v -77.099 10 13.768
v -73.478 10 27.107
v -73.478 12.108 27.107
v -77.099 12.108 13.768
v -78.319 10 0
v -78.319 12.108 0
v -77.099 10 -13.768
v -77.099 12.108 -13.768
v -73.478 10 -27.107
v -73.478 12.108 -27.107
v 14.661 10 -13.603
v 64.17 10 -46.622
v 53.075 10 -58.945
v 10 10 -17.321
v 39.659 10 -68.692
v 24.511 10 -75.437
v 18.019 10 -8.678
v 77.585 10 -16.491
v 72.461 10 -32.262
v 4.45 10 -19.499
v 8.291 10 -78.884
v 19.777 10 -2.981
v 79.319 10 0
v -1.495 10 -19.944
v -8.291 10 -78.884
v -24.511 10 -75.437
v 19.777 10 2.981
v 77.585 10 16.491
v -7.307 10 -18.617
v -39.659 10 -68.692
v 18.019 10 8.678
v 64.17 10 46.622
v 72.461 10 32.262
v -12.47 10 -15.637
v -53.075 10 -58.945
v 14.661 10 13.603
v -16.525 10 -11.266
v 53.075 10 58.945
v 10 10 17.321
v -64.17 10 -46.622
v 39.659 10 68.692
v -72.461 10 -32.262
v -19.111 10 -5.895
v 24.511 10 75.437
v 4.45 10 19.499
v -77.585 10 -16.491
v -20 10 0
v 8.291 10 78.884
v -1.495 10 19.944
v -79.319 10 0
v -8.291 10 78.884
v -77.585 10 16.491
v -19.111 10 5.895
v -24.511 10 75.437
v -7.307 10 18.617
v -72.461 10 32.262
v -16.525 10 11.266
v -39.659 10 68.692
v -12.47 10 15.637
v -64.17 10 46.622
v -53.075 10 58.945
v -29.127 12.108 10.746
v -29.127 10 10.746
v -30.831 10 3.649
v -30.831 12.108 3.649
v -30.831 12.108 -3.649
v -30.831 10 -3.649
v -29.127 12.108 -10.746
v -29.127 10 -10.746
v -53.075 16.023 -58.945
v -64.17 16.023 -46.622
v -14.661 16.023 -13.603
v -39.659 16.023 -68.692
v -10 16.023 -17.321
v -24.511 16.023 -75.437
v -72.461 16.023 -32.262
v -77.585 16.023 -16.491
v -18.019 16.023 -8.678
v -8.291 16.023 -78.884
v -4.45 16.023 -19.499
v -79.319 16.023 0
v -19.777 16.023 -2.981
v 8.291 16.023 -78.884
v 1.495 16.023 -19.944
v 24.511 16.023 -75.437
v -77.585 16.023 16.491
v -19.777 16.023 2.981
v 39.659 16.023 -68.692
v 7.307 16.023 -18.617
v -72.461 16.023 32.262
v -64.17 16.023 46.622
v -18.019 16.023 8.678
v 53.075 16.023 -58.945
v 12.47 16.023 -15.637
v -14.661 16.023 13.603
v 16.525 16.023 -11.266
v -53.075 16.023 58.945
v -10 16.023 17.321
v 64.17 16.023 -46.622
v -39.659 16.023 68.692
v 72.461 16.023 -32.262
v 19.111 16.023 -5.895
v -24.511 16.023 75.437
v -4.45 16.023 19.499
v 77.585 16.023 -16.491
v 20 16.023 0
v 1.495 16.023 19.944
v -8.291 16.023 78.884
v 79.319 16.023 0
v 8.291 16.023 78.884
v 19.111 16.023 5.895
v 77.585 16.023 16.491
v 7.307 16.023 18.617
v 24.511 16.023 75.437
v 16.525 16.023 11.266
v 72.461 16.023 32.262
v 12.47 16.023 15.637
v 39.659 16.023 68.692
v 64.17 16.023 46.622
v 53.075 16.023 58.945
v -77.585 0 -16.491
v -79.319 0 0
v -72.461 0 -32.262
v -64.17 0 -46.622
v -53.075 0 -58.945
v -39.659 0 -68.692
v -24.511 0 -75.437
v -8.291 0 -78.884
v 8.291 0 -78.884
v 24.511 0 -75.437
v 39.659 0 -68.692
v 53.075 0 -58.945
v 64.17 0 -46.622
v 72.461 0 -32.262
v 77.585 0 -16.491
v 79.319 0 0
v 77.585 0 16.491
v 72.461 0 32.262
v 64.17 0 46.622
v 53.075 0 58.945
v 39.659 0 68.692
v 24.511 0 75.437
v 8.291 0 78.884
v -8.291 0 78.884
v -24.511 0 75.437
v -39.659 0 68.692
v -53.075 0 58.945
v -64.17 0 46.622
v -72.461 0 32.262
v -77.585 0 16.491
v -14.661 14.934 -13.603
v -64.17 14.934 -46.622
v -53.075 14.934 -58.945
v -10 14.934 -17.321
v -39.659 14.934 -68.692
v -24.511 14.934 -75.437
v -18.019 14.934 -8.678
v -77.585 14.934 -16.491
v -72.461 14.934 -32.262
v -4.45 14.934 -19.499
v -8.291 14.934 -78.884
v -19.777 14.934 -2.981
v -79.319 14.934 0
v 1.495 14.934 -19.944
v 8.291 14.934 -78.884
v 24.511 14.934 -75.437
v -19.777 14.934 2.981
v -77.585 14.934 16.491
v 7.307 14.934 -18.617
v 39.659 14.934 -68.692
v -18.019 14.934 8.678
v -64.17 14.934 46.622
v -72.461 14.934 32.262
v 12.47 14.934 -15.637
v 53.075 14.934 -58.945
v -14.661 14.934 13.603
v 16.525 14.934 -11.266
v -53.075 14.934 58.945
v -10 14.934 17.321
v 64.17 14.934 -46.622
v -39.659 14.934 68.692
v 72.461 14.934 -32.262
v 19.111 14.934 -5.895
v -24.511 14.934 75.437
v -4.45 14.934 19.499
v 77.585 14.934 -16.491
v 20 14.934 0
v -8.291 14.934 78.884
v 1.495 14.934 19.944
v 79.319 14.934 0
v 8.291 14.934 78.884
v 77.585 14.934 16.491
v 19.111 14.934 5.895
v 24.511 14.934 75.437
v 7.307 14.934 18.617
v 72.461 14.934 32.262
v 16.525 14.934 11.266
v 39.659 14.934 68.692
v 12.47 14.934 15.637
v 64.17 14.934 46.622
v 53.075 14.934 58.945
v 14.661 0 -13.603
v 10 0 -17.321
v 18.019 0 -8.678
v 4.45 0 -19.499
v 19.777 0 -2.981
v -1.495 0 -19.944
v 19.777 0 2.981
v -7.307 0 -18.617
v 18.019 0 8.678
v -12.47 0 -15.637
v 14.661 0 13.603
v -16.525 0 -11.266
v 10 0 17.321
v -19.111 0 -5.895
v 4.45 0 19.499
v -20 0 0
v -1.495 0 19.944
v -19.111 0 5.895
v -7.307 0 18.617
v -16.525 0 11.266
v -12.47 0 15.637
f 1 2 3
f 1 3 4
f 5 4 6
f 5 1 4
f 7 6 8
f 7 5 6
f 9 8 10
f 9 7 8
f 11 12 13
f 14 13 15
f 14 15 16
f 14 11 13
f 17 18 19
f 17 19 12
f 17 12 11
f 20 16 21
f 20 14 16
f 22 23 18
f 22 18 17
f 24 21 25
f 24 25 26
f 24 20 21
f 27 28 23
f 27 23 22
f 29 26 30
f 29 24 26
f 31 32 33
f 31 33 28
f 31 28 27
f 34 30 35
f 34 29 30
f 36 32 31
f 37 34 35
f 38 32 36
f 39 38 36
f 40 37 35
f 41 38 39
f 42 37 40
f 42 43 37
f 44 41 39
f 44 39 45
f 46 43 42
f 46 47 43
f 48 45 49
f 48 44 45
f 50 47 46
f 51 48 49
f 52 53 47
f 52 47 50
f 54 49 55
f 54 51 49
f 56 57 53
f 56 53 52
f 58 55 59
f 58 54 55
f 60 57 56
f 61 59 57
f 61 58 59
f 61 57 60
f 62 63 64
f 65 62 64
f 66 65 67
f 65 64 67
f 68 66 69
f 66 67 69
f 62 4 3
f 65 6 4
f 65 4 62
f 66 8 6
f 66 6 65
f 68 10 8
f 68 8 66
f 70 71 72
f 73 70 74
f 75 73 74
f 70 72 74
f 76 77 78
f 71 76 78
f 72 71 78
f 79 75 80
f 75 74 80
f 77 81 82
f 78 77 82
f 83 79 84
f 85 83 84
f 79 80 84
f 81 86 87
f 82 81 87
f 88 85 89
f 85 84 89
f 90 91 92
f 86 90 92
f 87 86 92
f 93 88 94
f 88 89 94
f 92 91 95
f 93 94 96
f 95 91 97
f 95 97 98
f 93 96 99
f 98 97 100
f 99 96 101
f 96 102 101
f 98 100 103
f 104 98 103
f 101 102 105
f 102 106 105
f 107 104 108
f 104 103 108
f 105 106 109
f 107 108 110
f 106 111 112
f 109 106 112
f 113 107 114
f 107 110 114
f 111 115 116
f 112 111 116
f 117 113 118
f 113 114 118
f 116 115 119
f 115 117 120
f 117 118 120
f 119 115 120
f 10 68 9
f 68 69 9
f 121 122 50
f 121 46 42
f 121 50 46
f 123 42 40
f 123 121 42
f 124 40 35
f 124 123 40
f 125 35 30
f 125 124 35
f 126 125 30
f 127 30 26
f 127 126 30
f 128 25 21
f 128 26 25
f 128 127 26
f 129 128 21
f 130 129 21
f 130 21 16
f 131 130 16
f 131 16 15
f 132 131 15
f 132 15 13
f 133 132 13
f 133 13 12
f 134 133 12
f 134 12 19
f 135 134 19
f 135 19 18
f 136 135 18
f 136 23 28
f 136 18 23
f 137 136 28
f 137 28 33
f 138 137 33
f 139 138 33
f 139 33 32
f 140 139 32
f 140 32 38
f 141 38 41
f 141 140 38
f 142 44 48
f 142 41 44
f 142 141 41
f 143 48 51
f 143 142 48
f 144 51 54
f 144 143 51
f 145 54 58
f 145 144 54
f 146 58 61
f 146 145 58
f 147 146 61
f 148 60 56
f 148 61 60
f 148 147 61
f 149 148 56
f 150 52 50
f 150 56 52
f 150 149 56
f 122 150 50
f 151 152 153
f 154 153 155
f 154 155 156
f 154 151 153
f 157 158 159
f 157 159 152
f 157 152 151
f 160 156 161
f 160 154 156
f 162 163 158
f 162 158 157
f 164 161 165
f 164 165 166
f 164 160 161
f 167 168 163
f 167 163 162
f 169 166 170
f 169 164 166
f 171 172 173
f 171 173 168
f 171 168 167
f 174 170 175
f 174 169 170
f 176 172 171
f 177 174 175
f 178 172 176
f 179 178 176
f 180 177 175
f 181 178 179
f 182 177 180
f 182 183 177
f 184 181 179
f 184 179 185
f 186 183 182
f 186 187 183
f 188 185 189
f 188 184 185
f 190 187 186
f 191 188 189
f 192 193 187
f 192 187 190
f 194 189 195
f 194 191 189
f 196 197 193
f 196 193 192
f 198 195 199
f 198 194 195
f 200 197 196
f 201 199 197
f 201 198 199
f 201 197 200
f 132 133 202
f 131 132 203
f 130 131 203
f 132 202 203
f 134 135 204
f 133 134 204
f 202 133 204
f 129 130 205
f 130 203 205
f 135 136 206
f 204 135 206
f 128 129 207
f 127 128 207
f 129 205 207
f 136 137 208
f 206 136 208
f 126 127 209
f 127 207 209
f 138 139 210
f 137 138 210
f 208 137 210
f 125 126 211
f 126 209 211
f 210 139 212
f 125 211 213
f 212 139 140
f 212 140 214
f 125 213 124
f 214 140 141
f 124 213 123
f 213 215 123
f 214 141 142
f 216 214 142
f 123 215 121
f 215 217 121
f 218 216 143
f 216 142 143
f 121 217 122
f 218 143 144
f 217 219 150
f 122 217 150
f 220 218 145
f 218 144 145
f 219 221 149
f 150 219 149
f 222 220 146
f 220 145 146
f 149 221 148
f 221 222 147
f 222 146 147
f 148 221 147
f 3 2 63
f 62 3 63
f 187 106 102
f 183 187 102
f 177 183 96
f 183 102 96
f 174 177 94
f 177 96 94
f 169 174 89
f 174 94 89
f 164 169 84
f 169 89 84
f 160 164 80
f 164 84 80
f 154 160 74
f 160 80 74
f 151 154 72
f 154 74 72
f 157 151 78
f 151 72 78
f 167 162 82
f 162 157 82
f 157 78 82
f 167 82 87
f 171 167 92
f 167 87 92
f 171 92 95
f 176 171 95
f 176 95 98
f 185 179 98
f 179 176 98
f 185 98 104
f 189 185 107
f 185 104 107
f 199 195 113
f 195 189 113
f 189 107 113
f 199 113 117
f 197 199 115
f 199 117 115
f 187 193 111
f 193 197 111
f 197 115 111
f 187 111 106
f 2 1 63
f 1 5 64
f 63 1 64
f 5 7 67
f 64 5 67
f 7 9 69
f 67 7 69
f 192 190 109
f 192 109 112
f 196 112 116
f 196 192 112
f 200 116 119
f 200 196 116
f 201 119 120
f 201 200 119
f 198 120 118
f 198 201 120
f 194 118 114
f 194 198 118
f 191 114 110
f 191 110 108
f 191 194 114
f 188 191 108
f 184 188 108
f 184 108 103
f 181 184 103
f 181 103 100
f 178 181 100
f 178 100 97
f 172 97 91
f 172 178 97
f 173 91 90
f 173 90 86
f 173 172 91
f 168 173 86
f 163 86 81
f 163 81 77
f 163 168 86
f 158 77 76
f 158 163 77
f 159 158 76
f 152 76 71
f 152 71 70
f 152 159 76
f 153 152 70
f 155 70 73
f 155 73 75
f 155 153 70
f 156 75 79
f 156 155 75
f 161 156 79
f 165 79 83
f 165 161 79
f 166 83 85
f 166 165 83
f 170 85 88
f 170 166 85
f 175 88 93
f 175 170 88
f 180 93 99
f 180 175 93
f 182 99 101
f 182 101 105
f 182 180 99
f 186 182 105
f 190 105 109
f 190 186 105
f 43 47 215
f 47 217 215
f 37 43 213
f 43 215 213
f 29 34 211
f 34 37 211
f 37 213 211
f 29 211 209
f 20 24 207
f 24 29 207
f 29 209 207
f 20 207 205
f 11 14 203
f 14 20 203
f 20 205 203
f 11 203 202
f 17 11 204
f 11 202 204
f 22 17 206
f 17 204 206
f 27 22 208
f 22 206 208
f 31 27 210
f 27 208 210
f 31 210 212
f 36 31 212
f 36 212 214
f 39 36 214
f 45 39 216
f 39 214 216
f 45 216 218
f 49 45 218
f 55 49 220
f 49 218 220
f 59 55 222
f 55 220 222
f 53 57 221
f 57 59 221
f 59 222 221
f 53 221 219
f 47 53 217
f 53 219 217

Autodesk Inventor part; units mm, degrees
ref_plane "YZ Plane" through (0, 0, 0) normal (1, 0, 0) x (0, 1, 0)
ref_plane "XZ Plane" through (0, 0, 0) normal (0, 1, 0) x (-1, 0, 0)
ref_plane "XY Plane" through (0, 0, 0) normal (0, 0, 1) x (1, 0, 0)
sketch "草圖1" plane through (0, 0, 0) normal (0, 1, 0) x (-1, 0, 0)
  circle A0 centre (0, 0) radius 79.3187
  circle A1 centre (0, 0) radius 20
  dimension "d_yo" = 158.6374
  dimension "d_yi" = 40
extrude "擠出1" add sketch "草圖1" along normal blind 10
sketch "草圖2" plane through (0, 10, 0) normal (0, 1, 0) x (1, 0, 0)
  arc A0 (-73.4779, 27.1074) -> (-73.4779, -27.1074) centre (0, 0) ccw
  line L0 (-90.8067, 0) -> (132.5495, 0) construction
  arc A1 (-29.1269, 10.7455) -> (-29.1269, -10.7455) centre (0, 0) ccw
  line L1 (-73.4779, -27.1074) -> (-29.1269, -10.7455)
  line L2 (-29.1269, 10.7455) -> (-73.4779, 27.1074)
  arc A2 (-51.3024, 18.9265) -> (-51.3024, -18.9265) centre (0, 0) ccw construction
  line L3 (-32.7889, -71.1246) -> (-12.9976, -28.194)
  arc A3 (-28.194, -12.9976) -> (-12.9976, -28.194) centre (0, 0) ccw
  line L4 (-28.194, -12.9976) -> (-71.1246, -32.7889)
  arc A4 (-71.1246, -32.7889) -> (-32.7889, -71.1246) centre (0, 0) ccw
  line L5 (27.1074, -73.4779) -> (10.7455, -29.1269)
  arc A5 (-10.7455, -29.1269) -> (10.7455, -29.1269) centre (0, 0) ccw
  line L6 (-10.7455, -29.1269) -> (-27.1074, -73.4779)
  arc A6 (-27.1074, -73.4779) -> (27.1074, -73.4779) centre (0, 0) ccw
  line L7 (71.1246, -32.7889) -> (28.194, -12.9976)
  arc A7 (12.9976, -28.194) -> (28.194, -12.9976) centre (0, 0) ccw
  line L8 (12.9976, -28.194) -> (32.7889, -71.1246)
  arc A8 (32.7889, -71.1246) -> (71.1246, -32.7889) centre (0, 0) ccw
  circle A9 centre (0, 0) radius 20 construction
  line L9 (73.4779, 27.1074) -> (29.1269, 10.7455)
  arc A10 (29.1269, -10.7455) -> (29.1269, 10.7455) centre (0, 0) ccw
  line L10 (29.1269, -10.7455) -> (73.4779, -27.1074)
  arc A11 (73.4779, -27.1074) -> (73.4779, 27.1074) centre (0, 0) ccw
  line L11 (32.7889, 71.1246) -> (12.9976, 28.194)
  arc A12 (28.194, 12.9976) -> (12.9976, 28.194) centre (0, 0) ccw
  line L12 (28.194, 12.9976) -> (71.1246, 32.7889)
  arc A13 (71.1246, 32.7889) -> (32.7889, 71.1246) centre (0, 0) ccw
  line L13 (-27.1074, 73.4779) -> (-10.7455, 29.1269)
  arc A14 (10.7455, 29.1269) -> (-10.7455, 29.1269) centre (0, 0) ccw
  line L14 (10.7455, 29.1269) -> (27.1074, 73.4779)
  arc A15 (27.1074, 73.4779) -> (-27.1074, 73.4779) centre (0, 0) ccw
  line L15 (-71.1246, 32.7889) -> (-28.194, 12.9976)
  arc A16 (-12.9976, 28.194) -> (-28.194, 12.9976) centre (0, 0) ccw
  line L16 (-12.9976, 28.194) -> (-32.7889, 71.1246)
  arc A17 (-32.7889, 71.1246) -> (-71.1246, 32.7889) centre (0, 0) ccw
  point P0 (-22.8933, -49.6593)
  point P1 (-49.6593, -22.8933)
  point P2 (18.9265, -51.3024)
  point P3 (-18.9265, -51.3024)
  point P4 (49.6593, -22.8933)
  point P5 (22.8933, -49.6593)
  point P6 (51.3024, 18.9265)
  point P7 (51.3024, -18.9265)
  point P8 (22.8933, 49.6593)
  point P9 (49.6593, 22.8933)
  point P10 (-18.9265, 51.3024)
  point P11 (18.9265, 51.3024)
  point P12 (-49.6593, 22.8933)
  point P13 (-22.8933, 49.6593)
  dimension "r_av" = 54.6822
  dimension "l_m" = 47.2729
  dimension "d8" = 360
  dimension "theta_magnet" = 40.5
extrude "擠出3" add sketch "草圖2" along normal blind 2.1078 separate body contours L2 A1 L1 A0
sketch "草圖3" plane through (0, 0, 0) normal (0, 0, 1) x (1, 0, 0)
  line L0 (20, 16.0229) -> (79.3187, 16.0229)
  line L1 (79.3187, 16.0229) -> (79.3187, 14.9344)
  line L2 (79.3187, 14.9344) -> (20, 14.9344)
  line L3 (20, 14.9344) -> (20, 16.0229)
  line L4 (0, 63.9711) -> (0, -11.167) construction
  line L5 (79.3187, 10) -> (-79.3187, 10) projected
  point P0 (0, 0)
  dimension "r_co" = 79.3187
  dimension "r_ci" = 20
  dimension "t_c" = 1.0885
  dimension "gap_low" = 4.9344
revolve "迴轉1" add sketch "草圖3" angle 360 about axis through (0, 63.9711, 0) along (0, -1, 0) separate body
equation "\"d_yo\" = 2 * r_yo"
equation "\"d_yi\" = 2 * r_yi"
equation "\"r_co\" = r_yo"
equation "\"r_ci\" = r_yi"
equation "\"r_yo\" = 79.31871"
equation "\"r_yi\" = 20"
equation "\"gap_high\" = 1"
equation "\"theta_p\" = 45deg"
equation "\"PM_ratio\" = 0.9"
properties part number "ECB_demo"
